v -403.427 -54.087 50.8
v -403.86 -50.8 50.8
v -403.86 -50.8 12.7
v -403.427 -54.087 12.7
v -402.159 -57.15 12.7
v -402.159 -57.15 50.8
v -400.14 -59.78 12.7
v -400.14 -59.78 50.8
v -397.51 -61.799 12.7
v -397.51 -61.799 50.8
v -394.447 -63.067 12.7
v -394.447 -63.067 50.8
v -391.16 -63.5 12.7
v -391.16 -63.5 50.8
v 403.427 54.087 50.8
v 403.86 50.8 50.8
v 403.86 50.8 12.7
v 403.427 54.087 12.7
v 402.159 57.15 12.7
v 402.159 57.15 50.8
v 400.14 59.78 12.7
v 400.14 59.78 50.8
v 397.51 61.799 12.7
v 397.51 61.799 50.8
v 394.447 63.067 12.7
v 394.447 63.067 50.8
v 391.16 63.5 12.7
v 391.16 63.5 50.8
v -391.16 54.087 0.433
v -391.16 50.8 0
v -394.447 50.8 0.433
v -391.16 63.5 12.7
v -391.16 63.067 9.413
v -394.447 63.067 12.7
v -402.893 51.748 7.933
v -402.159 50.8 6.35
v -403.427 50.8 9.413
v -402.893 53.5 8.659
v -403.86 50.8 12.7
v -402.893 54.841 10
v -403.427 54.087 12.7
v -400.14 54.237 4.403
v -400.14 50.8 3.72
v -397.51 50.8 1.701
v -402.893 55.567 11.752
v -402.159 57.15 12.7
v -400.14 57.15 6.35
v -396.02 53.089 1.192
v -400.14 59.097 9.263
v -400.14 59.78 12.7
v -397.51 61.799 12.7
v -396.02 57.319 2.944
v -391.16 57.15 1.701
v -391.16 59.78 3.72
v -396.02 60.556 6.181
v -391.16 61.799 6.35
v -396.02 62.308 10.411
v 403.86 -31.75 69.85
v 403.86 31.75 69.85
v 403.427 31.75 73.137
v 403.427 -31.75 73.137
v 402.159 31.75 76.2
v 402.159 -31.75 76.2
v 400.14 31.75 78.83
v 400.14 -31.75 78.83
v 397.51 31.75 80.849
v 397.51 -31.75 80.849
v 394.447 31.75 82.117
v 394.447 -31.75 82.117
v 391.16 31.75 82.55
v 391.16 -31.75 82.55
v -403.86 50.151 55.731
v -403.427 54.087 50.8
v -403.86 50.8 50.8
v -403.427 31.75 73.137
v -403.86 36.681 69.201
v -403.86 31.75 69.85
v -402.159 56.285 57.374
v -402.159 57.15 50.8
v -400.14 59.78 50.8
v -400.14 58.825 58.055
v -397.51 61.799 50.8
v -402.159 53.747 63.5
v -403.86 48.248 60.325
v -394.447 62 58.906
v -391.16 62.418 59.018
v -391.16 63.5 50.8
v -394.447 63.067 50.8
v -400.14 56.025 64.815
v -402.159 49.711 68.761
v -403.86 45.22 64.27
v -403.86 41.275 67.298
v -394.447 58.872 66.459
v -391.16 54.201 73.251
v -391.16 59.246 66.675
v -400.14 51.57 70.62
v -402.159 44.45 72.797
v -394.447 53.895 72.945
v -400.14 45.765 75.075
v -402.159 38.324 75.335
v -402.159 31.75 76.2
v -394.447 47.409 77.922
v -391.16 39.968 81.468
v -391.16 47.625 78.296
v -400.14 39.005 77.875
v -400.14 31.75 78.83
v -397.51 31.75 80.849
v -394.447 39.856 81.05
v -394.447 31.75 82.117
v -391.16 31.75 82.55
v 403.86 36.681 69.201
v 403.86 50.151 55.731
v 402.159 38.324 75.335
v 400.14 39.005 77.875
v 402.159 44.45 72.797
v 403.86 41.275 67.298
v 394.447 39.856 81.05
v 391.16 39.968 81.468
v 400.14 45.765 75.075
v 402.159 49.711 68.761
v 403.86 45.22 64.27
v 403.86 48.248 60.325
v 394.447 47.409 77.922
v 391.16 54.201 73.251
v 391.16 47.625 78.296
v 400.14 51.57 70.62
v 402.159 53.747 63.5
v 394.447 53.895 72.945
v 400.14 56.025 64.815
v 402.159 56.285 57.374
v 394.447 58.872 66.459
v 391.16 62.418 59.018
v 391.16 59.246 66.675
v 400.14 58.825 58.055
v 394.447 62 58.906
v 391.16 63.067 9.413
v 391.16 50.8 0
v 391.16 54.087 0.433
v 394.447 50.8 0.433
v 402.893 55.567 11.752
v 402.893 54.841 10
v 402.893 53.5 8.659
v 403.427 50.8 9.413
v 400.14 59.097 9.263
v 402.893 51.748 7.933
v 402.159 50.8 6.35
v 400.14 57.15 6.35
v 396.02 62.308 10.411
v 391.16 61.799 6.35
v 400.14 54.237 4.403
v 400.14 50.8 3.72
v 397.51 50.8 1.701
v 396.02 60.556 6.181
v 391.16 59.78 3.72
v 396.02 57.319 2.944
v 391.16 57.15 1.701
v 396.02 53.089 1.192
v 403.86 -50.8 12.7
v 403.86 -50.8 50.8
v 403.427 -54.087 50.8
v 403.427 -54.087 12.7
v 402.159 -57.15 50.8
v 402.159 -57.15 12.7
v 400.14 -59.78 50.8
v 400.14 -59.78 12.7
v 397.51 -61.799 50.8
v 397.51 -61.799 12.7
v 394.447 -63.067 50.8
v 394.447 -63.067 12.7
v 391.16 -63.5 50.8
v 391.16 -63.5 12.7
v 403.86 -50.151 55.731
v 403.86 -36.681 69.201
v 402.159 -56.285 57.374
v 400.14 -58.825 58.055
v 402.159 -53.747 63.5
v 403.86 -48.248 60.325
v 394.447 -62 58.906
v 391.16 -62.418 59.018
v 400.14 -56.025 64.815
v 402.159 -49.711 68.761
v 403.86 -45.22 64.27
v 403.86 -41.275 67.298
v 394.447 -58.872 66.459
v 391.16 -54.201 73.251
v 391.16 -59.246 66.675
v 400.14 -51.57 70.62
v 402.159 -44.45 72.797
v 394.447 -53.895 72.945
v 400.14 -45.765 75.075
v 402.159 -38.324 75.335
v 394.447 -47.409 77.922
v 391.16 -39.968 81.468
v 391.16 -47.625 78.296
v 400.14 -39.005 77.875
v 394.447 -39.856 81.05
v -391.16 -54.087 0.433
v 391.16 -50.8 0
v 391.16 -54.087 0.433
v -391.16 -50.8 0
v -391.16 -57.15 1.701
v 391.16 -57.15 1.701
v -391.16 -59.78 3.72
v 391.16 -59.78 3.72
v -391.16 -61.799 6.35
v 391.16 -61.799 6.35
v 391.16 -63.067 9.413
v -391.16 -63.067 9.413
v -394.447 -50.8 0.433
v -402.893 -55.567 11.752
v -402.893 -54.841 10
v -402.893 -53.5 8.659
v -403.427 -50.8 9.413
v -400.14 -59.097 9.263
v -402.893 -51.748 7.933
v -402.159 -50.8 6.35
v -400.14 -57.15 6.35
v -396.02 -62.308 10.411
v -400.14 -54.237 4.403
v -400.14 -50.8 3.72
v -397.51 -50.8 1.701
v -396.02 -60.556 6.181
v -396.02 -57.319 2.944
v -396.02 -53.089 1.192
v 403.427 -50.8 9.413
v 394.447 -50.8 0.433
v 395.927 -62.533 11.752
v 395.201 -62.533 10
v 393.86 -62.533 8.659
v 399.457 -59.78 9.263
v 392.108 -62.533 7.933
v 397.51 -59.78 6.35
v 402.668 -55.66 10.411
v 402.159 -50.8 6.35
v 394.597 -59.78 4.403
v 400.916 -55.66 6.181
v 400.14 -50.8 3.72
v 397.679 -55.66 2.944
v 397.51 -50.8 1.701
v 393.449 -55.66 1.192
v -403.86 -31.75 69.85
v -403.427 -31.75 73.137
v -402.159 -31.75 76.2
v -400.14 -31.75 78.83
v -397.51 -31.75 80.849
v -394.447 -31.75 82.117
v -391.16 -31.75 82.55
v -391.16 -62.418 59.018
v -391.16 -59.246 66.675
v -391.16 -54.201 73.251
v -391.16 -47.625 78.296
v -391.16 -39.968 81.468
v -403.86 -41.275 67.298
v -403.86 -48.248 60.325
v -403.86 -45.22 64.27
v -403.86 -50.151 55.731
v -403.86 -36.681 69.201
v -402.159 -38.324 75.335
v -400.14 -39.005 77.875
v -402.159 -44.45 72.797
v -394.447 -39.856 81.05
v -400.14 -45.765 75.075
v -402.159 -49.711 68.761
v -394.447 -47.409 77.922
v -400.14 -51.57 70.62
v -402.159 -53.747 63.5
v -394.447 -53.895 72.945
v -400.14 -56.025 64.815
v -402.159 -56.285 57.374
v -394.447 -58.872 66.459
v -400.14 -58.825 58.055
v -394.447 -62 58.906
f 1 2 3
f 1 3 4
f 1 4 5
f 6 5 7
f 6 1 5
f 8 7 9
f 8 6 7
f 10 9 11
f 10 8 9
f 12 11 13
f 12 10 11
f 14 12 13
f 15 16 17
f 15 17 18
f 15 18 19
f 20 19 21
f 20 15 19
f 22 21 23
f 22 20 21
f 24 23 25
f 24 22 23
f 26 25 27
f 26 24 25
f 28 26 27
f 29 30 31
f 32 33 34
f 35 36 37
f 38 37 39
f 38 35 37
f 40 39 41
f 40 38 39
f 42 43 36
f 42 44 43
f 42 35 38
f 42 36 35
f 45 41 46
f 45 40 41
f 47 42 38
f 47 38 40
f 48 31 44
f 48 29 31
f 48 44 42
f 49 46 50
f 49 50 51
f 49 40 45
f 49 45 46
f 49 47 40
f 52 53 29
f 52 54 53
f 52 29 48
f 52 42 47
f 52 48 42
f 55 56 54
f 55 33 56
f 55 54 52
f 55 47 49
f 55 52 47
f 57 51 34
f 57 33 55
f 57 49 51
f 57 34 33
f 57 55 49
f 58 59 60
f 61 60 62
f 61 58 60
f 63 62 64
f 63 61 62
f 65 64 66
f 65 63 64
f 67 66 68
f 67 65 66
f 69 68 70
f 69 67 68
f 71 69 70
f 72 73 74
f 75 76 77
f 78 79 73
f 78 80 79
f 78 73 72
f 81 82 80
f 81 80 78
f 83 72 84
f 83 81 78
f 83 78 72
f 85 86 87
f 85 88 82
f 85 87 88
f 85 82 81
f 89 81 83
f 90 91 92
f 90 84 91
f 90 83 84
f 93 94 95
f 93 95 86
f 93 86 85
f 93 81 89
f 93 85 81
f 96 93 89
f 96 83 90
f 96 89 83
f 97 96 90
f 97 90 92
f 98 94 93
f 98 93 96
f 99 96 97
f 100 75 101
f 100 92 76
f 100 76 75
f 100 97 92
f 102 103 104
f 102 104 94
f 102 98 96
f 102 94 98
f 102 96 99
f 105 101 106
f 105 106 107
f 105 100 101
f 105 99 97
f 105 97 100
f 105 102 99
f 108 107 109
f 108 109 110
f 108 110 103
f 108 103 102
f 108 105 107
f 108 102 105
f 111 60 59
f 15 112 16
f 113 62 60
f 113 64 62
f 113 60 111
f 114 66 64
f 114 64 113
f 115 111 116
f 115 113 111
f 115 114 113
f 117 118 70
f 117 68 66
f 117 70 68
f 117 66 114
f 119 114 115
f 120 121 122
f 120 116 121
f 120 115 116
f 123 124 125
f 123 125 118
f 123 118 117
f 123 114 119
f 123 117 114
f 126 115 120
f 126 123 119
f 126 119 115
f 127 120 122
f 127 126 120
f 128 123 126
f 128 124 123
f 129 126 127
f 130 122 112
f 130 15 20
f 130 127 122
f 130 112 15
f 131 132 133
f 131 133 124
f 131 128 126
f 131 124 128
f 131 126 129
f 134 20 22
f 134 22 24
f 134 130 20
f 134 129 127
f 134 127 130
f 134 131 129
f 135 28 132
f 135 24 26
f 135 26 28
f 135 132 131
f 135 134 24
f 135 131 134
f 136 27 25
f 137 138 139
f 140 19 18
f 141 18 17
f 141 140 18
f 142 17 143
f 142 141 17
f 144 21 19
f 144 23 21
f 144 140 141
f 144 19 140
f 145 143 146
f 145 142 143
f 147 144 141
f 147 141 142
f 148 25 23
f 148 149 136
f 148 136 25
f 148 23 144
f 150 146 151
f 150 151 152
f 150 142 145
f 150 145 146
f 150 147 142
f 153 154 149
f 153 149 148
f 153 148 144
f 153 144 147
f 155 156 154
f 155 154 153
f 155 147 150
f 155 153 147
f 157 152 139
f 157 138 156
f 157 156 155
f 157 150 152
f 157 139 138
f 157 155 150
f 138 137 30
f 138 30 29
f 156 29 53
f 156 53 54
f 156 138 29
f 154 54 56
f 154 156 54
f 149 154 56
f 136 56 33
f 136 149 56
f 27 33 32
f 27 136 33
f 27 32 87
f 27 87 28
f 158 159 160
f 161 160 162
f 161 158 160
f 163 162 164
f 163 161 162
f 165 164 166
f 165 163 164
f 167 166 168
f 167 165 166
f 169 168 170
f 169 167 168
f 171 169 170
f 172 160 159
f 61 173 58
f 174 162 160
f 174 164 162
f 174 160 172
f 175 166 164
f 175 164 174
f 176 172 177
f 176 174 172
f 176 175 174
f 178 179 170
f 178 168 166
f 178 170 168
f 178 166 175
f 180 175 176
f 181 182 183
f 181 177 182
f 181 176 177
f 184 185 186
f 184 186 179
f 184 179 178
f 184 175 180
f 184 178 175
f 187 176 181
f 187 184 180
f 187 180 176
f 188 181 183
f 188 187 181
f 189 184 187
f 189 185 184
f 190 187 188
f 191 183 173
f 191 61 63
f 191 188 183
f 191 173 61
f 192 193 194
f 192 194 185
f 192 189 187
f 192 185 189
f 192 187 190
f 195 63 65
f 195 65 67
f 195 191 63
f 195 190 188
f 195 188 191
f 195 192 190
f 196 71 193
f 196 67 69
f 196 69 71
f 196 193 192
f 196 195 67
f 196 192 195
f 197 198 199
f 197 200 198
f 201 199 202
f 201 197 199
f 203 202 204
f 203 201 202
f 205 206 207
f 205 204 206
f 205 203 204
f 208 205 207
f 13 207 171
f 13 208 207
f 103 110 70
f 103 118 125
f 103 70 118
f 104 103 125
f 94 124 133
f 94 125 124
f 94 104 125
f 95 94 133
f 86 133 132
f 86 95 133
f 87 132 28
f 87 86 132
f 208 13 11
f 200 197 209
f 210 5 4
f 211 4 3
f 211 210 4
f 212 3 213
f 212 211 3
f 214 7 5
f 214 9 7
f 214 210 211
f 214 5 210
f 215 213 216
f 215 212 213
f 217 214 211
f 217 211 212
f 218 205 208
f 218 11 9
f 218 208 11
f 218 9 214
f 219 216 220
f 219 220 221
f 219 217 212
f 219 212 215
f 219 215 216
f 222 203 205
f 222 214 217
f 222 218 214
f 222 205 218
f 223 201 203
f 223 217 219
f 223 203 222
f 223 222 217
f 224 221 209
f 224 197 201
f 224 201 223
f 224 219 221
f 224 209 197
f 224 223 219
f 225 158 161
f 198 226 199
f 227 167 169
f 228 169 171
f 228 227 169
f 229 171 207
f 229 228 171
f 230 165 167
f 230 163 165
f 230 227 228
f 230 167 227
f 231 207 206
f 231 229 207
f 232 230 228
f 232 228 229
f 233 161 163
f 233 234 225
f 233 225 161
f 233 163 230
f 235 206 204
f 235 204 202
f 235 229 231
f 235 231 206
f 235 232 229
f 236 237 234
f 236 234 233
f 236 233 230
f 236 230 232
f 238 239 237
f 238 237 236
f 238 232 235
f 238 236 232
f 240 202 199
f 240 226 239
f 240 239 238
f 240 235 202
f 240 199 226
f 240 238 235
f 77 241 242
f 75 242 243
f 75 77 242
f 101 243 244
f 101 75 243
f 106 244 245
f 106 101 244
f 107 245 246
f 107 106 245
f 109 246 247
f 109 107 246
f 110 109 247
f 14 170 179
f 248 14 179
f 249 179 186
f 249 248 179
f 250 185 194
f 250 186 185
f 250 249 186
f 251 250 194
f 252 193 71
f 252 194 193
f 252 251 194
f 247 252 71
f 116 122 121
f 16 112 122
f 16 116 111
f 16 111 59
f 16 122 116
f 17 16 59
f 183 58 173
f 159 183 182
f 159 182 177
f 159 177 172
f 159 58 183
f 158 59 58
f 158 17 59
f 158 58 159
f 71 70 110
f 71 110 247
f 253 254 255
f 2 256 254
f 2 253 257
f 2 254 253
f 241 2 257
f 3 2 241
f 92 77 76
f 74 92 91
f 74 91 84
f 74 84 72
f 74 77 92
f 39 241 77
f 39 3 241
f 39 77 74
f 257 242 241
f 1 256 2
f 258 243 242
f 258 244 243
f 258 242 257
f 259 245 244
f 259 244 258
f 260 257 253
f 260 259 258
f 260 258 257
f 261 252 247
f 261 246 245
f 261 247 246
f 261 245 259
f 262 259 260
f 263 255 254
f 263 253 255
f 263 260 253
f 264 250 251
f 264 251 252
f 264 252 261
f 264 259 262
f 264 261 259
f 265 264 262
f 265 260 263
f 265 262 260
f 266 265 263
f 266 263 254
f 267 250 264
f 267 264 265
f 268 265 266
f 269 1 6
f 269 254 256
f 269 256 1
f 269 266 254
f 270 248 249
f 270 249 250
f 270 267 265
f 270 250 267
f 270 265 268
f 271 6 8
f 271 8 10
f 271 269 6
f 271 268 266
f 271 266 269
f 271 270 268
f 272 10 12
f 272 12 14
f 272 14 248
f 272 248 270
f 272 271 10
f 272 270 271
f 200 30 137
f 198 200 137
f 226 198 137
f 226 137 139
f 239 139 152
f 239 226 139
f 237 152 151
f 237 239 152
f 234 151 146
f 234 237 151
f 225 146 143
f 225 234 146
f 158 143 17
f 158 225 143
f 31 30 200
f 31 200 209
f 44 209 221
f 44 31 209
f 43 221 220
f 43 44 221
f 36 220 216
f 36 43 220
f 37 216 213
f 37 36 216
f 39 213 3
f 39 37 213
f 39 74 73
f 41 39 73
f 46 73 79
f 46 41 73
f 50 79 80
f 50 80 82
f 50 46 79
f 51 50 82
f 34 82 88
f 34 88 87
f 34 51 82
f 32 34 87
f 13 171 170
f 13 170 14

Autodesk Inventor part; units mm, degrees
ref_plane "YZ Plane" through (0, 0, 0) normal (1, 0, 0) x (0, 1, 0)
ref_plane "XZ Plane" through (0, 0, 0) normal (0, 1, 0) x (-1, 0, 0)
ref_plane "XY Plane" through (0, 0, 0) normal (0, 0, 1) x (1, 0, 0)
sketch "Sketch1" plane through (0, 0, 0) normal (0, 0, 1) x (1, 0, 0)
  line L0 (-403.86, 63.5) -> (403.86, 63.5)
  line L1 (403.86, 63.5) -> (403.86, -63.5)
  line L2 (403.86, -63.5) -> (-403.86, -63.5)
  line L3 (-403.86, -63.5) -> (-403.86, 63.5)
  point P0 (0, 0)
  point P1 (-403.86, 0)
  point P2 (0, 63.5)
  dimension "d0" = 807.72
  dimension "d1" = 127
extrude "Extrusion1" add sketch "Sketch1" along normal blind 19.05
sketch "Sketch2" plane through (0, 0, 0) normal (1, 0, 0) x (0, 1, 0)
  line L0 (63.5, 19.05) -> (63.5, 0) construction
  line L1 (63.5, 0) -> (-63.5, 0) construction
  line L2 (-63.5, 0) -> (-63.5, 19.05) construction
  line L3 (-63.5, 19.05) -> (63.5, 19.05) construction
  circle A0 centre (31.75, 50.8) radius 31.75
  circle A1 centre (-31.75, 50.8) radius 31.75
  point P0 (0, 0)
  dimension "d4" = 63.5
  dimension "d5" = 63.5
extrude "Extrusion2" add sketch "Sketch2" along normal mid plane 807.72
sketch "Sketch4" plane through (403.86, -63.5, 0) normal (1, 0, 0) x (0, 0, -1)
  line L0 (-19.05, 127) -> (0, 127) projected
  line L1 (0, 127) -> (0, 0) projected
  line L2 (0, 0) -> (-19.05, 0) projected
  line L3 (-19.05, 0) -> (-19.05, 31.75) projected
  line L4 (-19.05, 31.75) -> (-19.05, 95.25) projected
  arc A0 (-50.8, 63.5) -> (-19.05, 95.25) centre (-50.8, 95.25) ccw projected
  arc A1 (-50.8, 63.5) -> (-19.05, 31.75) centre (-50.8, 31.75) ccw projected
  arc A2 (-19.05, 31.75) -> (-50.8, 63.5) centre (-50.8, 31.75) ccw projected
  arc A3 (-19.05, 95.25) -> (-50.8, 63.5) centre (-50.8, 95.25) ccw projected
  line L5 (-19.05, 95.25) -> (-19.05, 127) projected
  line L6 (-19.05, 127) -> (-50.8, 127)
  line L7 (-82.55, 95.25) -> (-82.55, 31.75)
  line L8 (-50.8, 0) -> (-19.05, 0)
  point P0 (0, 63.5)
extrude "Extrusion4" add sketch "Sketch4" against normal blind 807.72 contours L5 A3 L6 | L4 A2 A0 | L3 L8 A1 | A1 L7 A3
fillet "Fillet1" radius 12.7 14 edges at (0, 63.5, 0) (403.86, 0, 0) (0, -63.5, 0) (-403.86, 0, 0) (403.86, -63.5, 25.4) (-403.86, -63.5, 25.4) (403.86, -54.2006, 73.2506) (403.86, 0, 82.55) (403.86, 54.2006, 73.2506) (403.86, 63.5, 25.4) (-403.86, -54.2006, 73.2506) (-403.86, 0, 82.55) (-403.86, 54.2006, 73.2506) (-403.86, 63.5, 25.4)
equation "\"d6\" = d0"
equation "\"d10\" = d0"
properties part number "SideBumpers"
